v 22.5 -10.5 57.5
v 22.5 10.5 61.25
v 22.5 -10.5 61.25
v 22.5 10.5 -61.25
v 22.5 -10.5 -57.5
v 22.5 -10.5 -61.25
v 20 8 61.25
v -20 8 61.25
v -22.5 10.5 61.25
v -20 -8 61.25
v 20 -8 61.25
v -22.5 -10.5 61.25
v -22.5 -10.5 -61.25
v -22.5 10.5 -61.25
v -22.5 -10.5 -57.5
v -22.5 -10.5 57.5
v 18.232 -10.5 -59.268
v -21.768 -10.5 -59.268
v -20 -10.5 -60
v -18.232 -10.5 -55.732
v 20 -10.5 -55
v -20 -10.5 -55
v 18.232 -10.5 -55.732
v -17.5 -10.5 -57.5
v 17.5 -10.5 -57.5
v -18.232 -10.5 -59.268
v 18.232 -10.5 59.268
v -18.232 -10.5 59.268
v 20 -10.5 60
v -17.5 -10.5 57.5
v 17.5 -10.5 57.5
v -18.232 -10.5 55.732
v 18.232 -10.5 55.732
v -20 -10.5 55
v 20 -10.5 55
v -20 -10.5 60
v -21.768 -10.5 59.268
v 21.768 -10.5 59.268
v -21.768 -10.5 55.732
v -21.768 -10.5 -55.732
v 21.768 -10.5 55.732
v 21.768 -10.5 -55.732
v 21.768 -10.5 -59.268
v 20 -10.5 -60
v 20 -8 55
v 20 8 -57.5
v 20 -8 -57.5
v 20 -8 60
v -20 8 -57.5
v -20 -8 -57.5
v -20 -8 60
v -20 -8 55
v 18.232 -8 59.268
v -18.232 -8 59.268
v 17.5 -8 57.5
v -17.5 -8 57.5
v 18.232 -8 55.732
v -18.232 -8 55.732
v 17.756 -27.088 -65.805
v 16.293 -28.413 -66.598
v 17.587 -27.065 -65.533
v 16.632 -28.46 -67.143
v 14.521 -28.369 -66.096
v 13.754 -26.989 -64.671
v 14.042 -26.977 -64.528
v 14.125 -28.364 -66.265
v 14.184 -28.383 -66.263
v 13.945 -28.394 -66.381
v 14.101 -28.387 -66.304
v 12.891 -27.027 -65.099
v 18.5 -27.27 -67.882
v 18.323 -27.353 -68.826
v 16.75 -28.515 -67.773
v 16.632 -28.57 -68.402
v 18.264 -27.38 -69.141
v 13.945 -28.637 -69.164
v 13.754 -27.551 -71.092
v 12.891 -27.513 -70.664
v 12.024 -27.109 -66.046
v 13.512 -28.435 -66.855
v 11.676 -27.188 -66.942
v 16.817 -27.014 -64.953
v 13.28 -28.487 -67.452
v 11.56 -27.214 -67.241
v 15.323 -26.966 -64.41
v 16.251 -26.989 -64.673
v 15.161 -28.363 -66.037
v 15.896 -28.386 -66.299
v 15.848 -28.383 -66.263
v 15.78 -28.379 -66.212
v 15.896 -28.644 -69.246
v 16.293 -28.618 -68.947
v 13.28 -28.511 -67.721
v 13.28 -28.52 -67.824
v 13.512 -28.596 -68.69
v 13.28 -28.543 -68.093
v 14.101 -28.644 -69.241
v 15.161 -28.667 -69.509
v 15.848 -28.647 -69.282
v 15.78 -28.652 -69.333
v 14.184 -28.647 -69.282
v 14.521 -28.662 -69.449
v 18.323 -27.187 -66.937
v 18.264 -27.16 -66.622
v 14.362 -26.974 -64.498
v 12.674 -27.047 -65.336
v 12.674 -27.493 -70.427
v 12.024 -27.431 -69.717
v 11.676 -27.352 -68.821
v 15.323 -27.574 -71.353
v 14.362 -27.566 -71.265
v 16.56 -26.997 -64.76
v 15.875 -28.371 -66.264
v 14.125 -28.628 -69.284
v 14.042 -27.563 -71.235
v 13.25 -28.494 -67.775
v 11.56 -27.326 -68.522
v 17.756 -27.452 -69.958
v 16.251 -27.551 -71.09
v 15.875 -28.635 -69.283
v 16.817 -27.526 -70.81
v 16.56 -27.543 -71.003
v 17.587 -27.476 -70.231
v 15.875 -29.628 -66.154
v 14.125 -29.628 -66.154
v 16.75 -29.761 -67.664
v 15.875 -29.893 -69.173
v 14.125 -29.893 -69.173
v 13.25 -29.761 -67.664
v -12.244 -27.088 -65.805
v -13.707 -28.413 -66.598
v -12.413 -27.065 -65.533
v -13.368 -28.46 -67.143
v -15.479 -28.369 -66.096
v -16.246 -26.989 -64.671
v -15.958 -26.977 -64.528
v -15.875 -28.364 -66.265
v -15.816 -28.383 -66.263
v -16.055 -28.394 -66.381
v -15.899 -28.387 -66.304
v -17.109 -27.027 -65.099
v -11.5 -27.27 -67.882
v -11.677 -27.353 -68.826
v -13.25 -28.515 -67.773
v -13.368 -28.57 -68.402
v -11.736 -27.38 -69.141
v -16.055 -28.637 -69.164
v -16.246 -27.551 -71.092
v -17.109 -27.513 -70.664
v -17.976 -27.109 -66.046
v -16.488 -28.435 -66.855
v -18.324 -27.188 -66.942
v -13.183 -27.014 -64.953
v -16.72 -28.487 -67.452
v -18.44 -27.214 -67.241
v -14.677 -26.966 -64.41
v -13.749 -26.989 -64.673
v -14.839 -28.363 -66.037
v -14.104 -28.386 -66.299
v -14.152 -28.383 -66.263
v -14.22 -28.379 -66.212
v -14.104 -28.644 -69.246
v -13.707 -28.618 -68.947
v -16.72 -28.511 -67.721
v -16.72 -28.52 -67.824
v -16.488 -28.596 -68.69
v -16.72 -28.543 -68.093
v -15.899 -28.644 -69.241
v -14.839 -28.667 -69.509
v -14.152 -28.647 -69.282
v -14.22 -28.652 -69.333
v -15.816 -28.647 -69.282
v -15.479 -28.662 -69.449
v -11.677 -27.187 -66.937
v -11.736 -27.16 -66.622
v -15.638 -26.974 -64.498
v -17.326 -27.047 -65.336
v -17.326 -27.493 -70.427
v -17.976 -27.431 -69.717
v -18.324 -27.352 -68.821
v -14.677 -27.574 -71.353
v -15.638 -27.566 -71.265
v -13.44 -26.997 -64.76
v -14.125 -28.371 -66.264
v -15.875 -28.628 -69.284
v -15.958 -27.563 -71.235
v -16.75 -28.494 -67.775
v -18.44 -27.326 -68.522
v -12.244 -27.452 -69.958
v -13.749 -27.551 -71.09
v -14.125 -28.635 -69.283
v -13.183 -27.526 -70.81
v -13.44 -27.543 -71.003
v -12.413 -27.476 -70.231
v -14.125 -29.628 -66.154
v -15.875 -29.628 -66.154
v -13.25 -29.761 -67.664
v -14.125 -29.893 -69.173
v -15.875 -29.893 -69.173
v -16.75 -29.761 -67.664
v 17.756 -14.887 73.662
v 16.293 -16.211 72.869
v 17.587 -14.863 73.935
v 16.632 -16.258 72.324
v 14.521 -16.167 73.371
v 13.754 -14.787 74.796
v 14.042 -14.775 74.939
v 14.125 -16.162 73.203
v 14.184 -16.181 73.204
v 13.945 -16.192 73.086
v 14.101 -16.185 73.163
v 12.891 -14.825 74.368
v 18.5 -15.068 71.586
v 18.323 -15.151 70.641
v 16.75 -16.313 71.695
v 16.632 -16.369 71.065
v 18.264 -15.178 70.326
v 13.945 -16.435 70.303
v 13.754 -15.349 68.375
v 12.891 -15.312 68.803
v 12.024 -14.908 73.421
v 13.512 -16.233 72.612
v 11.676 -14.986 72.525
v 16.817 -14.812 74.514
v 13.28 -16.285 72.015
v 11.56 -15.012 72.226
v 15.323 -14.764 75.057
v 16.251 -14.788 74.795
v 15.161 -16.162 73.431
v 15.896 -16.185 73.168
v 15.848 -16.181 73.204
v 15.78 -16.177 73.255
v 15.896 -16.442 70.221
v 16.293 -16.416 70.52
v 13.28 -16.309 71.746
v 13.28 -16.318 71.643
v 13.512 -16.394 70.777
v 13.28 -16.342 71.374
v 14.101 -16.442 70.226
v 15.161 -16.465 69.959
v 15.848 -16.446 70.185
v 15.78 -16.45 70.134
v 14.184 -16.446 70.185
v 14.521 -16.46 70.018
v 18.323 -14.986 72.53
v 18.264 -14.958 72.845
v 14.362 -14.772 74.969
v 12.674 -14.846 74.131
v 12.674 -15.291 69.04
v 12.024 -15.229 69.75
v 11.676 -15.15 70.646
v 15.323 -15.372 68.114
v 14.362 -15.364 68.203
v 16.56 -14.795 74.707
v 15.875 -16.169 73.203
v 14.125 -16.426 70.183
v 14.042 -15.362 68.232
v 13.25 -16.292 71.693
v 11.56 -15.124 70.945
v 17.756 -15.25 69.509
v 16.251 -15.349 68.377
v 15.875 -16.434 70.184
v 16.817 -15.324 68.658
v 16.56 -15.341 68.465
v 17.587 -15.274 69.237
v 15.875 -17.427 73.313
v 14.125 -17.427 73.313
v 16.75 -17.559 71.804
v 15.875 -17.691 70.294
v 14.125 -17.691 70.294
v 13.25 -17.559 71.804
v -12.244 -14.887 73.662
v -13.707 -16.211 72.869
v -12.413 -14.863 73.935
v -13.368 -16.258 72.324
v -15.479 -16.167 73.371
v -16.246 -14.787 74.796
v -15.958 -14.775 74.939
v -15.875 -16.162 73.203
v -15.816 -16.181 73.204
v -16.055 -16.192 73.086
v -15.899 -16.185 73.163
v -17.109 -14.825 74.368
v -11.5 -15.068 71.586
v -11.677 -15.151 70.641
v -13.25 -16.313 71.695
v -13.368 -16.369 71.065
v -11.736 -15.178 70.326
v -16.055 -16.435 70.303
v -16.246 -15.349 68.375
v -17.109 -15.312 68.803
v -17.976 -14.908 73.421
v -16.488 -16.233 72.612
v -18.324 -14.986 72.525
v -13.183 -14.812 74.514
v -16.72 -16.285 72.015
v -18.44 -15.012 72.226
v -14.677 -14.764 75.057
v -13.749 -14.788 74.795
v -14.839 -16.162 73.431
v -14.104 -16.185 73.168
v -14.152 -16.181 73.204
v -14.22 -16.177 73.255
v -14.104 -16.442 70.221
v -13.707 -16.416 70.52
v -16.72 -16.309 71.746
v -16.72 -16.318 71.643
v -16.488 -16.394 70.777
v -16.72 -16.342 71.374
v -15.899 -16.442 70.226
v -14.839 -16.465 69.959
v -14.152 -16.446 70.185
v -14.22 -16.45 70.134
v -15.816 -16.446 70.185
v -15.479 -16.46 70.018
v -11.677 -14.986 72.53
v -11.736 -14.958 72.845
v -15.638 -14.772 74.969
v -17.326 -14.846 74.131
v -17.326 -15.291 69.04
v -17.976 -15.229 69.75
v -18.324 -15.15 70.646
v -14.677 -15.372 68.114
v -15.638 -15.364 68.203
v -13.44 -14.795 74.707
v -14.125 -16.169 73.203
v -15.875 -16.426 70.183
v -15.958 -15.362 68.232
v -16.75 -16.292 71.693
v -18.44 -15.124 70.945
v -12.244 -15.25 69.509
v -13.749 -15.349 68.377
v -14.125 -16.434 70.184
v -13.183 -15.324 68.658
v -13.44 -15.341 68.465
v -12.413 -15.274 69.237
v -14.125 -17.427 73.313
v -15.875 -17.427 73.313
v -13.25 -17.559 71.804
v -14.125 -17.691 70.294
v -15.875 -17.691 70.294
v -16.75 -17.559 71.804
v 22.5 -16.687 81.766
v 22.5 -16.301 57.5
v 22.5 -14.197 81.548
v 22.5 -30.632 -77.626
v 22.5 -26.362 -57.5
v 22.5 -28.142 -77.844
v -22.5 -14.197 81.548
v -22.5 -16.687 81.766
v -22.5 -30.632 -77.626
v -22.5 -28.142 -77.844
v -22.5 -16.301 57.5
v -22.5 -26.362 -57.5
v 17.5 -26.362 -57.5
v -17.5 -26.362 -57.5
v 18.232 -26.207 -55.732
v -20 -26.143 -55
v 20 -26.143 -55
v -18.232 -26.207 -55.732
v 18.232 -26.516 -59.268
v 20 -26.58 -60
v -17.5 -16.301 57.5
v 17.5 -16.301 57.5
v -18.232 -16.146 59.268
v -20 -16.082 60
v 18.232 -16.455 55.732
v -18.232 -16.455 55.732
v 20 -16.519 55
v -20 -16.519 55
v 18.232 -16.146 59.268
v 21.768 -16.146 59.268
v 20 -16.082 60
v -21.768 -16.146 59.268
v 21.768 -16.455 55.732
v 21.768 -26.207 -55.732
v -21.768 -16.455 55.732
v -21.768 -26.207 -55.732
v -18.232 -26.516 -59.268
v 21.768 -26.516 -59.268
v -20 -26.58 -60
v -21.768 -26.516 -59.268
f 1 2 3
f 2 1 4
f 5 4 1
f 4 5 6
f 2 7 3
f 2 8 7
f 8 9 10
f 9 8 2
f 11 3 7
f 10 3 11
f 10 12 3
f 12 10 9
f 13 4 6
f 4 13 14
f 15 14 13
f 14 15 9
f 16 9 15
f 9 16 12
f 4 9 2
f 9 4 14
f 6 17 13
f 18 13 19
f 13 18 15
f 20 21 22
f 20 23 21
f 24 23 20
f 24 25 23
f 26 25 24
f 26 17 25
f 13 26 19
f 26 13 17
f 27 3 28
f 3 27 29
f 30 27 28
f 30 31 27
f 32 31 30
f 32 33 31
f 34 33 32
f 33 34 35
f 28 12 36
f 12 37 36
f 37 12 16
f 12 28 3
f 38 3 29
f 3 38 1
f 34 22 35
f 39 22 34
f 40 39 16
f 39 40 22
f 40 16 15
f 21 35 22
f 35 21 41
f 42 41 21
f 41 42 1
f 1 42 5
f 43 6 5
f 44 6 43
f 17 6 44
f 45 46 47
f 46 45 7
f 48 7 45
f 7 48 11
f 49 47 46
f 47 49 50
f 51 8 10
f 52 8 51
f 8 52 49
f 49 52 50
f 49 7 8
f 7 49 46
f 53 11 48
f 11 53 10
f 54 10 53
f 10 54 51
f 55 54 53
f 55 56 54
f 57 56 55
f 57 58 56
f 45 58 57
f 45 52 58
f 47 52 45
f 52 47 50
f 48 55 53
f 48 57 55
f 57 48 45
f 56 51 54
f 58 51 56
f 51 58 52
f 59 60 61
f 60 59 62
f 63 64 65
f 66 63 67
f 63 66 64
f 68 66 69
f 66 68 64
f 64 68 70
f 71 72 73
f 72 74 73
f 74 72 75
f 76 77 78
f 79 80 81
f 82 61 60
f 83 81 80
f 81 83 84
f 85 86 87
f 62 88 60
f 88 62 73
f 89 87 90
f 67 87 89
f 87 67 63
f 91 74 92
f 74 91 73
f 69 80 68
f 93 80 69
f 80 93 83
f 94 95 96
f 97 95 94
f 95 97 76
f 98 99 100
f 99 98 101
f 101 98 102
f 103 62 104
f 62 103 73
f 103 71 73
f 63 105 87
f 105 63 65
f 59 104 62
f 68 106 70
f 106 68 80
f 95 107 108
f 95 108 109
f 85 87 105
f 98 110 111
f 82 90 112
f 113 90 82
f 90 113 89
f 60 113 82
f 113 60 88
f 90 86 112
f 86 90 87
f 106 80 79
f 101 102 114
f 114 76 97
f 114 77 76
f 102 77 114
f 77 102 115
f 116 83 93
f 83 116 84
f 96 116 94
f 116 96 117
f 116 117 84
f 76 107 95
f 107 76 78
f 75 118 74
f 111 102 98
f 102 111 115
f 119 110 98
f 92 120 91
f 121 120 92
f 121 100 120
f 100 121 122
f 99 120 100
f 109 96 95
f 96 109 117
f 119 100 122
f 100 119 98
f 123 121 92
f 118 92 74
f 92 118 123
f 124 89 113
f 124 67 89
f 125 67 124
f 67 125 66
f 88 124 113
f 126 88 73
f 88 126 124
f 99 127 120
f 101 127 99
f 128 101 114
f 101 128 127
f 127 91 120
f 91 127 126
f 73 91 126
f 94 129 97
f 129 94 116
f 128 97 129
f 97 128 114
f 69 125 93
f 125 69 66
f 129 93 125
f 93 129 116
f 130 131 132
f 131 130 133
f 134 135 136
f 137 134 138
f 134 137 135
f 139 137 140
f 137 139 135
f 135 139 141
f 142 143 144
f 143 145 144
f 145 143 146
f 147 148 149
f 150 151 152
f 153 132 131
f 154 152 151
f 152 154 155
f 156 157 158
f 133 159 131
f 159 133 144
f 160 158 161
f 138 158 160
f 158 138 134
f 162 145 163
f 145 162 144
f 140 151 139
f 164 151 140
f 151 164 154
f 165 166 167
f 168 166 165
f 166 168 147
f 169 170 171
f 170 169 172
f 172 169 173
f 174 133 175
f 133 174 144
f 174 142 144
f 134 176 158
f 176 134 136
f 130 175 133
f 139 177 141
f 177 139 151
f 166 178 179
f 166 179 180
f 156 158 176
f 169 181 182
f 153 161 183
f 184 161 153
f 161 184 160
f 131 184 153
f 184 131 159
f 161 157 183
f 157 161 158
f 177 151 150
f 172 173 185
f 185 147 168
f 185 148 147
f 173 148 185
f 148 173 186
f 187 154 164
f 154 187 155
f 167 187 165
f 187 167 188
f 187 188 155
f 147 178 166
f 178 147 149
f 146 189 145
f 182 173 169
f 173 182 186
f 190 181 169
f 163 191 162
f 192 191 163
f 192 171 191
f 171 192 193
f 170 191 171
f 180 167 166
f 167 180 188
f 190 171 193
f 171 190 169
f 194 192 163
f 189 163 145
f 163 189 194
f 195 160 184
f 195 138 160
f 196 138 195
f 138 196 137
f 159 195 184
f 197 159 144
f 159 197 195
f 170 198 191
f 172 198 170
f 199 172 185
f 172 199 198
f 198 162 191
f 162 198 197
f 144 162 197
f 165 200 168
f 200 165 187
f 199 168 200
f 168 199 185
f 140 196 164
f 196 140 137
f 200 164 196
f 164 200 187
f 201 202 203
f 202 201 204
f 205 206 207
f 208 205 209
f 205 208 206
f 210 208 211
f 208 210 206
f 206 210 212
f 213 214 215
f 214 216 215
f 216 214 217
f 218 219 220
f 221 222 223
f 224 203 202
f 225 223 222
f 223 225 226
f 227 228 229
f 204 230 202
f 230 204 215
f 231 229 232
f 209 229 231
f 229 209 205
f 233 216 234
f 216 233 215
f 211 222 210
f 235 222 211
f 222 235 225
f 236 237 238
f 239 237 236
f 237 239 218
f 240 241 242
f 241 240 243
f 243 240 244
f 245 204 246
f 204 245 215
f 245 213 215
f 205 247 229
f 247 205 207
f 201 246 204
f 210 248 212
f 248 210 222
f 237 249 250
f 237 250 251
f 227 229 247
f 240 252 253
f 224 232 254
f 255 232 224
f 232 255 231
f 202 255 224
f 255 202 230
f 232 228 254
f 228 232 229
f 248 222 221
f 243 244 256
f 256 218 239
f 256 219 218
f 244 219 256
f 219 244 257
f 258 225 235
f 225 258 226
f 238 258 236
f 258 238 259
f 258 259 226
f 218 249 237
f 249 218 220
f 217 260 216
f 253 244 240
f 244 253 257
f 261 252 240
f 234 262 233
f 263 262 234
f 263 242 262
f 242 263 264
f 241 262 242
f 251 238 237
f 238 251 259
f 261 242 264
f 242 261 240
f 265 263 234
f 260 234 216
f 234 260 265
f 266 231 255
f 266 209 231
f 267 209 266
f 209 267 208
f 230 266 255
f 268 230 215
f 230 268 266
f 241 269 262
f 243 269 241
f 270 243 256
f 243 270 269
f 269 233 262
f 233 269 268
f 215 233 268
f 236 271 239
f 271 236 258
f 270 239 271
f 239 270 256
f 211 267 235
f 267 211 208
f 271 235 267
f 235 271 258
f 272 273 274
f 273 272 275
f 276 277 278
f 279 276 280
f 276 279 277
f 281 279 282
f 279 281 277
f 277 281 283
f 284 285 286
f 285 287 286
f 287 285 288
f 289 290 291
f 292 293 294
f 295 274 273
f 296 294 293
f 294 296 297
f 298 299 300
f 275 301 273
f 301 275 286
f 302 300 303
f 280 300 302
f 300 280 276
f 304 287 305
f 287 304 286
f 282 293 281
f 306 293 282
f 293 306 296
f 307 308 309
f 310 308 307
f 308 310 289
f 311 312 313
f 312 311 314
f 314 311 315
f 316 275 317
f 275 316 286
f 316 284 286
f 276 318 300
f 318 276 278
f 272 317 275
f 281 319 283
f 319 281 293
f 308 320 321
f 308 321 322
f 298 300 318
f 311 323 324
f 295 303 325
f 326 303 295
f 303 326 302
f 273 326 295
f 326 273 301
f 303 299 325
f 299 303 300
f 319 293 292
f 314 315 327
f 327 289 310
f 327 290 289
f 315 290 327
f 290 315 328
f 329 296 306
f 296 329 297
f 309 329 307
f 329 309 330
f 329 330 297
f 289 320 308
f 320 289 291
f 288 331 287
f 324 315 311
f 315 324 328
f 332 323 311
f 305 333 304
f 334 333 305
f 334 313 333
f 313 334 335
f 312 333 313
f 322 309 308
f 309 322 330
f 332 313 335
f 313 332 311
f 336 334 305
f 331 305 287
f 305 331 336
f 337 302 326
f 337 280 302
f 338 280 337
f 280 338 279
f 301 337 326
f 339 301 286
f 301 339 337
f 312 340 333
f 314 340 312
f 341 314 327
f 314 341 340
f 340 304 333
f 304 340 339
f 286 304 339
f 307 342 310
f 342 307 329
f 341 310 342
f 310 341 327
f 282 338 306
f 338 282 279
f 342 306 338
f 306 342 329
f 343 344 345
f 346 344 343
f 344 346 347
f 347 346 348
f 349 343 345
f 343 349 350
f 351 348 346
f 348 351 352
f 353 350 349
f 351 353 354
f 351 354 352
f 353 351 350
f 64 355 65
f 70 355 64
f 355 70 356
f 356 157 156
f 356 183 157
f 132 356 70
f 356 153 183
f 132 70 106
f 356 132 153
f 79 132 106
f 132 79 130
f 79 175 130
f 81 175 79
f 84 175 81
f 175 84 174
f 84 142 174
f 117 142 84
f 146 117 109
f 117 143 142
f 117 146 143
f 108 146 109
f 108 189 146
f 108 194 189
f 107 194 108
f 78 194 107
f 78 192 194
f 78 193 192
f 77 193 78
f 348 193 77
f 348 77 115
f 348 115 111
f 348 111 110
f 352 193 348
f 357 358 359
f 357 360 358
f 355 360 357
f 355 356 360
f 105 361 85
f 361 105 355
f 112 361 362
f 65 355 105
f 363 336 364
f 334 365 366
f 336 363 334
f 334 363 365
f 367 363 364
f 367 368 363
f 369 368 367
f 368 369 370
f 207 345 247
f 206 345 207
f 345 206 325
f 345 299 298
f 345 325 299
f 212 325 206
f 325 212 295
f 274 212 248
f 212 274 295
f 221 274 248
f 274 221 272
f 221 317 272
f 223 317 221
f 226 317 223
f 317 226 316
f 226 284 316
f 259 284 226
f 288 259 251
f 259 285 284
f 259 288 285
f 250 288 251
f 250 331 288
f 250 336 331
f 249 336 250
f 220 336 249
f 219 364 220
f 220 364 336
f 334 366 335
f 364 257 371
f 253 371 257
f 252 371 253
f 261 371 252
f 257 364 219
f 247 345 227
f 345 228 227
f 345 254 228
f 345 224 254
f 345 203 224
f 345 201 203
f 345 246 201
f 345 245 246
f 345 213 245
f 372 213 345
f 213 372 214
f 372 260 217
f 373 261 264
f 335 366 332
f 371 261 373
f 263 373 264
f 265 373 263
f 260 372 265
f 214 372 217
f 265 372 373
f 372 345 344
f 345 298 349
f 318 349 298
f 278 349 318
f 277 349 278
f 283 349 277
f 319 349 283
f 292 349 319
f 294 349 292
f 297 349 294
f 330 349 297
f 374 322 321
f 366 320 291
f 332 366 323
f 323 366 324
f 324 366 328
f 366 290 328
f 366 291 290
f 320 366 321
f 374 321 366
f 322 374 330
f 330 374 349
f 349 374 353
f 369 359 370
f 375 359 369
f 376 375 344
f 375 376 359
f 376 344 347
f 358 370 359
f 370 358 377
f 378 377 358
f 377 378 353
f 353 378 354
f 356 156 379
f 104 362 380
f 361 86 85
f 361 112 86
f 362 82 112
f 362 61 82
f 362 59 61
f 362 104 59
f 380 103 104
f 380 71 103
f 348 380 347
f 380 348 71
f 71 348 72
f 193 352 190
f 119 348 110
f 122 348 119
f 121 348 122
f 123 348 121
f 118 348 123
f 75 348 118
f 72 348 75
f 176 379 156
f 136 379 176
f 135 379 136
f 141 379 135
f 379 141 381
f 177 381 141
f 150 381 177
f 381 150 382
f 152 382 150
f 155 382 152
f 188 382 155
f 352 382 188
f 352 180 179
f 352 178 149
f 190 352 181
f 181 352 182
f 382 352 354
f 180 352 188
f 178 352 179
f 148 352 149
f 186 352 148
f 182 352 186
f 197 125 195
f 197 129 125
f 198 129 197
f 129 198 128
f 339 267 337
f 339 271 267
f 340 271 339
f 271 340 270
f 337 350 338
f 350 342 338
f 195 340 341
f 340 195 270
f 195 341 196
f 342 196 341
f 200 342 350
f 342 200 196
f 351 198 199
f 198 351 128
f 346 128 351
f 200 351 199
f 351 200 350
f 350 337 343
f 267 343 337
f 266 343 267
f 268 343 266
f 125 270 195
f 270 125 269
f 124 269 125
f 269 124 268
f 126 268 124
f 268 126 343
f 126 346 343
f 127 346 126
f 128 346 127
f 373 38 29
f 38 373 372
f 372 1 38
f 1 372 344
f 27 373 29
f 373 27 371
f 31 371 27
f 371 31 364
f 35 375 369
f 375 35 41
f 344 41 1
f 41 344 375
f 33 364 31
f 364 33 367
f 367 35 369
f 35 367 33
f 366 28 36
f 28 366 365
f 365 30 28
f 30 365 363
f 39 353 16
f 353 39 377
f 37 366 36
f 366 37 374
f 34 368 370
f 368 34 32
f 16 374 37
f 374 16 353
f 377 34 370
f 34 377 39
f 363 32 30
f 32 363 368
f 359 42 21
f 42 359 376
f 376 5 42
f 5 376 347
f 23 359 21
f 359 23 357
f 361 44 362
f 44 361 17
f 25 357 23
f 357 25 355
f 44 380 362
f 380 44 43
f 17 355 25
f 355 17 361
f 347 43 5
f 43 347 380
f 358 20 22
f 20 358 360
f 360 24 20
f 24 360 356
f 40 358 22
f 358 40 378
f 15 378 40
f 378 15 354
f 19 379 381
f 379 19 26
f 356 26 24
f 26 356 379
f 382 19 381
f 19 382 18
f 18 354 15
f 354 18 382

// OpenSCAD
width=40;
depth=16;
length=120;
caseThickness=2.5;
mountingLipLength=20;
screwDiameter=3.5;

module screwHole () {
    color("green",1.0) {
        translate([0,0,caseThickness/2])
            cylinder(h = caseThickness, d1 = screwDiameter, d2 = screwDiameter*3, center = true);
        translate([0,0,-caseThickness]){
            cylinder(h=(caseThickness*2), d=screwDiameter);
        };
    }
}

module box() {
    difference() {
        cube([width+2*caseThickness,depth+2*caseThickness,length+1*caseThickness], center = true);
        translate([0,0,caseThickness])
            cube([width,depth,length], center = true);
    }
}

module mountPlate() {
    difference() {
        color("blue", 1.0) {
            cube([width+2*caseThickness,caseThickness,length+2*mountingLipLength], center = true);
        }
        rotate([-90,0,0]) {
            translate([(width-10)/2,(length+mountingLipLength)/2,0])
                screwHole();
            translate([-(width-10)/2,(length+mountingLipLength)/2,0])
                screwHole();
            translate([(width-10)/2,-(length+mountingLipLength)/2,0])
                screwHole();
            translate([-(width-10)/2,-(length+mountingLipLength)/2,0])
                screwHole();
        }
    }
}

module mountSupports() {
    color("red", 1.0) {
        // Top left
        translate([width/2,-(depth/2+2*caseThickness),length/2-caseThickness])
            rotate([90,0,0])
                cylinder(h = 10, d = 5, center = true);
        // Top right
        translate([-width/2,-(depth/2+2*caseThickness),length/2-caseThickness])
            rotate([90,0,0])
                cylinder(h = 10, d = 5, center = true);
        // Bottom left
        translate([width/2,-(depth/2+2*caseThickness)-5,-(length/2-caseThickness)])
            rotate([90,0,0])
                cylinder(h = 19, d = 5, center = true);
        // Bottom right
        translate([-width/2,-(depth/2+2*caseThickness)-5,-(length/2-caseThickness)])
            rotate([90,0,0])
                cylinder(h = 19, d = 5, center = true);
    }
}

module UnderDeskAircoRemoteControlStorage() {
    union () {
        box();
        rotate([-5,0,0])
            translate([0,-(depth+2.6*caseThickness),0])
                mountPlate();
        mountSupports();
    }
}

UnderDeskAircoRemoteControlStorage();
